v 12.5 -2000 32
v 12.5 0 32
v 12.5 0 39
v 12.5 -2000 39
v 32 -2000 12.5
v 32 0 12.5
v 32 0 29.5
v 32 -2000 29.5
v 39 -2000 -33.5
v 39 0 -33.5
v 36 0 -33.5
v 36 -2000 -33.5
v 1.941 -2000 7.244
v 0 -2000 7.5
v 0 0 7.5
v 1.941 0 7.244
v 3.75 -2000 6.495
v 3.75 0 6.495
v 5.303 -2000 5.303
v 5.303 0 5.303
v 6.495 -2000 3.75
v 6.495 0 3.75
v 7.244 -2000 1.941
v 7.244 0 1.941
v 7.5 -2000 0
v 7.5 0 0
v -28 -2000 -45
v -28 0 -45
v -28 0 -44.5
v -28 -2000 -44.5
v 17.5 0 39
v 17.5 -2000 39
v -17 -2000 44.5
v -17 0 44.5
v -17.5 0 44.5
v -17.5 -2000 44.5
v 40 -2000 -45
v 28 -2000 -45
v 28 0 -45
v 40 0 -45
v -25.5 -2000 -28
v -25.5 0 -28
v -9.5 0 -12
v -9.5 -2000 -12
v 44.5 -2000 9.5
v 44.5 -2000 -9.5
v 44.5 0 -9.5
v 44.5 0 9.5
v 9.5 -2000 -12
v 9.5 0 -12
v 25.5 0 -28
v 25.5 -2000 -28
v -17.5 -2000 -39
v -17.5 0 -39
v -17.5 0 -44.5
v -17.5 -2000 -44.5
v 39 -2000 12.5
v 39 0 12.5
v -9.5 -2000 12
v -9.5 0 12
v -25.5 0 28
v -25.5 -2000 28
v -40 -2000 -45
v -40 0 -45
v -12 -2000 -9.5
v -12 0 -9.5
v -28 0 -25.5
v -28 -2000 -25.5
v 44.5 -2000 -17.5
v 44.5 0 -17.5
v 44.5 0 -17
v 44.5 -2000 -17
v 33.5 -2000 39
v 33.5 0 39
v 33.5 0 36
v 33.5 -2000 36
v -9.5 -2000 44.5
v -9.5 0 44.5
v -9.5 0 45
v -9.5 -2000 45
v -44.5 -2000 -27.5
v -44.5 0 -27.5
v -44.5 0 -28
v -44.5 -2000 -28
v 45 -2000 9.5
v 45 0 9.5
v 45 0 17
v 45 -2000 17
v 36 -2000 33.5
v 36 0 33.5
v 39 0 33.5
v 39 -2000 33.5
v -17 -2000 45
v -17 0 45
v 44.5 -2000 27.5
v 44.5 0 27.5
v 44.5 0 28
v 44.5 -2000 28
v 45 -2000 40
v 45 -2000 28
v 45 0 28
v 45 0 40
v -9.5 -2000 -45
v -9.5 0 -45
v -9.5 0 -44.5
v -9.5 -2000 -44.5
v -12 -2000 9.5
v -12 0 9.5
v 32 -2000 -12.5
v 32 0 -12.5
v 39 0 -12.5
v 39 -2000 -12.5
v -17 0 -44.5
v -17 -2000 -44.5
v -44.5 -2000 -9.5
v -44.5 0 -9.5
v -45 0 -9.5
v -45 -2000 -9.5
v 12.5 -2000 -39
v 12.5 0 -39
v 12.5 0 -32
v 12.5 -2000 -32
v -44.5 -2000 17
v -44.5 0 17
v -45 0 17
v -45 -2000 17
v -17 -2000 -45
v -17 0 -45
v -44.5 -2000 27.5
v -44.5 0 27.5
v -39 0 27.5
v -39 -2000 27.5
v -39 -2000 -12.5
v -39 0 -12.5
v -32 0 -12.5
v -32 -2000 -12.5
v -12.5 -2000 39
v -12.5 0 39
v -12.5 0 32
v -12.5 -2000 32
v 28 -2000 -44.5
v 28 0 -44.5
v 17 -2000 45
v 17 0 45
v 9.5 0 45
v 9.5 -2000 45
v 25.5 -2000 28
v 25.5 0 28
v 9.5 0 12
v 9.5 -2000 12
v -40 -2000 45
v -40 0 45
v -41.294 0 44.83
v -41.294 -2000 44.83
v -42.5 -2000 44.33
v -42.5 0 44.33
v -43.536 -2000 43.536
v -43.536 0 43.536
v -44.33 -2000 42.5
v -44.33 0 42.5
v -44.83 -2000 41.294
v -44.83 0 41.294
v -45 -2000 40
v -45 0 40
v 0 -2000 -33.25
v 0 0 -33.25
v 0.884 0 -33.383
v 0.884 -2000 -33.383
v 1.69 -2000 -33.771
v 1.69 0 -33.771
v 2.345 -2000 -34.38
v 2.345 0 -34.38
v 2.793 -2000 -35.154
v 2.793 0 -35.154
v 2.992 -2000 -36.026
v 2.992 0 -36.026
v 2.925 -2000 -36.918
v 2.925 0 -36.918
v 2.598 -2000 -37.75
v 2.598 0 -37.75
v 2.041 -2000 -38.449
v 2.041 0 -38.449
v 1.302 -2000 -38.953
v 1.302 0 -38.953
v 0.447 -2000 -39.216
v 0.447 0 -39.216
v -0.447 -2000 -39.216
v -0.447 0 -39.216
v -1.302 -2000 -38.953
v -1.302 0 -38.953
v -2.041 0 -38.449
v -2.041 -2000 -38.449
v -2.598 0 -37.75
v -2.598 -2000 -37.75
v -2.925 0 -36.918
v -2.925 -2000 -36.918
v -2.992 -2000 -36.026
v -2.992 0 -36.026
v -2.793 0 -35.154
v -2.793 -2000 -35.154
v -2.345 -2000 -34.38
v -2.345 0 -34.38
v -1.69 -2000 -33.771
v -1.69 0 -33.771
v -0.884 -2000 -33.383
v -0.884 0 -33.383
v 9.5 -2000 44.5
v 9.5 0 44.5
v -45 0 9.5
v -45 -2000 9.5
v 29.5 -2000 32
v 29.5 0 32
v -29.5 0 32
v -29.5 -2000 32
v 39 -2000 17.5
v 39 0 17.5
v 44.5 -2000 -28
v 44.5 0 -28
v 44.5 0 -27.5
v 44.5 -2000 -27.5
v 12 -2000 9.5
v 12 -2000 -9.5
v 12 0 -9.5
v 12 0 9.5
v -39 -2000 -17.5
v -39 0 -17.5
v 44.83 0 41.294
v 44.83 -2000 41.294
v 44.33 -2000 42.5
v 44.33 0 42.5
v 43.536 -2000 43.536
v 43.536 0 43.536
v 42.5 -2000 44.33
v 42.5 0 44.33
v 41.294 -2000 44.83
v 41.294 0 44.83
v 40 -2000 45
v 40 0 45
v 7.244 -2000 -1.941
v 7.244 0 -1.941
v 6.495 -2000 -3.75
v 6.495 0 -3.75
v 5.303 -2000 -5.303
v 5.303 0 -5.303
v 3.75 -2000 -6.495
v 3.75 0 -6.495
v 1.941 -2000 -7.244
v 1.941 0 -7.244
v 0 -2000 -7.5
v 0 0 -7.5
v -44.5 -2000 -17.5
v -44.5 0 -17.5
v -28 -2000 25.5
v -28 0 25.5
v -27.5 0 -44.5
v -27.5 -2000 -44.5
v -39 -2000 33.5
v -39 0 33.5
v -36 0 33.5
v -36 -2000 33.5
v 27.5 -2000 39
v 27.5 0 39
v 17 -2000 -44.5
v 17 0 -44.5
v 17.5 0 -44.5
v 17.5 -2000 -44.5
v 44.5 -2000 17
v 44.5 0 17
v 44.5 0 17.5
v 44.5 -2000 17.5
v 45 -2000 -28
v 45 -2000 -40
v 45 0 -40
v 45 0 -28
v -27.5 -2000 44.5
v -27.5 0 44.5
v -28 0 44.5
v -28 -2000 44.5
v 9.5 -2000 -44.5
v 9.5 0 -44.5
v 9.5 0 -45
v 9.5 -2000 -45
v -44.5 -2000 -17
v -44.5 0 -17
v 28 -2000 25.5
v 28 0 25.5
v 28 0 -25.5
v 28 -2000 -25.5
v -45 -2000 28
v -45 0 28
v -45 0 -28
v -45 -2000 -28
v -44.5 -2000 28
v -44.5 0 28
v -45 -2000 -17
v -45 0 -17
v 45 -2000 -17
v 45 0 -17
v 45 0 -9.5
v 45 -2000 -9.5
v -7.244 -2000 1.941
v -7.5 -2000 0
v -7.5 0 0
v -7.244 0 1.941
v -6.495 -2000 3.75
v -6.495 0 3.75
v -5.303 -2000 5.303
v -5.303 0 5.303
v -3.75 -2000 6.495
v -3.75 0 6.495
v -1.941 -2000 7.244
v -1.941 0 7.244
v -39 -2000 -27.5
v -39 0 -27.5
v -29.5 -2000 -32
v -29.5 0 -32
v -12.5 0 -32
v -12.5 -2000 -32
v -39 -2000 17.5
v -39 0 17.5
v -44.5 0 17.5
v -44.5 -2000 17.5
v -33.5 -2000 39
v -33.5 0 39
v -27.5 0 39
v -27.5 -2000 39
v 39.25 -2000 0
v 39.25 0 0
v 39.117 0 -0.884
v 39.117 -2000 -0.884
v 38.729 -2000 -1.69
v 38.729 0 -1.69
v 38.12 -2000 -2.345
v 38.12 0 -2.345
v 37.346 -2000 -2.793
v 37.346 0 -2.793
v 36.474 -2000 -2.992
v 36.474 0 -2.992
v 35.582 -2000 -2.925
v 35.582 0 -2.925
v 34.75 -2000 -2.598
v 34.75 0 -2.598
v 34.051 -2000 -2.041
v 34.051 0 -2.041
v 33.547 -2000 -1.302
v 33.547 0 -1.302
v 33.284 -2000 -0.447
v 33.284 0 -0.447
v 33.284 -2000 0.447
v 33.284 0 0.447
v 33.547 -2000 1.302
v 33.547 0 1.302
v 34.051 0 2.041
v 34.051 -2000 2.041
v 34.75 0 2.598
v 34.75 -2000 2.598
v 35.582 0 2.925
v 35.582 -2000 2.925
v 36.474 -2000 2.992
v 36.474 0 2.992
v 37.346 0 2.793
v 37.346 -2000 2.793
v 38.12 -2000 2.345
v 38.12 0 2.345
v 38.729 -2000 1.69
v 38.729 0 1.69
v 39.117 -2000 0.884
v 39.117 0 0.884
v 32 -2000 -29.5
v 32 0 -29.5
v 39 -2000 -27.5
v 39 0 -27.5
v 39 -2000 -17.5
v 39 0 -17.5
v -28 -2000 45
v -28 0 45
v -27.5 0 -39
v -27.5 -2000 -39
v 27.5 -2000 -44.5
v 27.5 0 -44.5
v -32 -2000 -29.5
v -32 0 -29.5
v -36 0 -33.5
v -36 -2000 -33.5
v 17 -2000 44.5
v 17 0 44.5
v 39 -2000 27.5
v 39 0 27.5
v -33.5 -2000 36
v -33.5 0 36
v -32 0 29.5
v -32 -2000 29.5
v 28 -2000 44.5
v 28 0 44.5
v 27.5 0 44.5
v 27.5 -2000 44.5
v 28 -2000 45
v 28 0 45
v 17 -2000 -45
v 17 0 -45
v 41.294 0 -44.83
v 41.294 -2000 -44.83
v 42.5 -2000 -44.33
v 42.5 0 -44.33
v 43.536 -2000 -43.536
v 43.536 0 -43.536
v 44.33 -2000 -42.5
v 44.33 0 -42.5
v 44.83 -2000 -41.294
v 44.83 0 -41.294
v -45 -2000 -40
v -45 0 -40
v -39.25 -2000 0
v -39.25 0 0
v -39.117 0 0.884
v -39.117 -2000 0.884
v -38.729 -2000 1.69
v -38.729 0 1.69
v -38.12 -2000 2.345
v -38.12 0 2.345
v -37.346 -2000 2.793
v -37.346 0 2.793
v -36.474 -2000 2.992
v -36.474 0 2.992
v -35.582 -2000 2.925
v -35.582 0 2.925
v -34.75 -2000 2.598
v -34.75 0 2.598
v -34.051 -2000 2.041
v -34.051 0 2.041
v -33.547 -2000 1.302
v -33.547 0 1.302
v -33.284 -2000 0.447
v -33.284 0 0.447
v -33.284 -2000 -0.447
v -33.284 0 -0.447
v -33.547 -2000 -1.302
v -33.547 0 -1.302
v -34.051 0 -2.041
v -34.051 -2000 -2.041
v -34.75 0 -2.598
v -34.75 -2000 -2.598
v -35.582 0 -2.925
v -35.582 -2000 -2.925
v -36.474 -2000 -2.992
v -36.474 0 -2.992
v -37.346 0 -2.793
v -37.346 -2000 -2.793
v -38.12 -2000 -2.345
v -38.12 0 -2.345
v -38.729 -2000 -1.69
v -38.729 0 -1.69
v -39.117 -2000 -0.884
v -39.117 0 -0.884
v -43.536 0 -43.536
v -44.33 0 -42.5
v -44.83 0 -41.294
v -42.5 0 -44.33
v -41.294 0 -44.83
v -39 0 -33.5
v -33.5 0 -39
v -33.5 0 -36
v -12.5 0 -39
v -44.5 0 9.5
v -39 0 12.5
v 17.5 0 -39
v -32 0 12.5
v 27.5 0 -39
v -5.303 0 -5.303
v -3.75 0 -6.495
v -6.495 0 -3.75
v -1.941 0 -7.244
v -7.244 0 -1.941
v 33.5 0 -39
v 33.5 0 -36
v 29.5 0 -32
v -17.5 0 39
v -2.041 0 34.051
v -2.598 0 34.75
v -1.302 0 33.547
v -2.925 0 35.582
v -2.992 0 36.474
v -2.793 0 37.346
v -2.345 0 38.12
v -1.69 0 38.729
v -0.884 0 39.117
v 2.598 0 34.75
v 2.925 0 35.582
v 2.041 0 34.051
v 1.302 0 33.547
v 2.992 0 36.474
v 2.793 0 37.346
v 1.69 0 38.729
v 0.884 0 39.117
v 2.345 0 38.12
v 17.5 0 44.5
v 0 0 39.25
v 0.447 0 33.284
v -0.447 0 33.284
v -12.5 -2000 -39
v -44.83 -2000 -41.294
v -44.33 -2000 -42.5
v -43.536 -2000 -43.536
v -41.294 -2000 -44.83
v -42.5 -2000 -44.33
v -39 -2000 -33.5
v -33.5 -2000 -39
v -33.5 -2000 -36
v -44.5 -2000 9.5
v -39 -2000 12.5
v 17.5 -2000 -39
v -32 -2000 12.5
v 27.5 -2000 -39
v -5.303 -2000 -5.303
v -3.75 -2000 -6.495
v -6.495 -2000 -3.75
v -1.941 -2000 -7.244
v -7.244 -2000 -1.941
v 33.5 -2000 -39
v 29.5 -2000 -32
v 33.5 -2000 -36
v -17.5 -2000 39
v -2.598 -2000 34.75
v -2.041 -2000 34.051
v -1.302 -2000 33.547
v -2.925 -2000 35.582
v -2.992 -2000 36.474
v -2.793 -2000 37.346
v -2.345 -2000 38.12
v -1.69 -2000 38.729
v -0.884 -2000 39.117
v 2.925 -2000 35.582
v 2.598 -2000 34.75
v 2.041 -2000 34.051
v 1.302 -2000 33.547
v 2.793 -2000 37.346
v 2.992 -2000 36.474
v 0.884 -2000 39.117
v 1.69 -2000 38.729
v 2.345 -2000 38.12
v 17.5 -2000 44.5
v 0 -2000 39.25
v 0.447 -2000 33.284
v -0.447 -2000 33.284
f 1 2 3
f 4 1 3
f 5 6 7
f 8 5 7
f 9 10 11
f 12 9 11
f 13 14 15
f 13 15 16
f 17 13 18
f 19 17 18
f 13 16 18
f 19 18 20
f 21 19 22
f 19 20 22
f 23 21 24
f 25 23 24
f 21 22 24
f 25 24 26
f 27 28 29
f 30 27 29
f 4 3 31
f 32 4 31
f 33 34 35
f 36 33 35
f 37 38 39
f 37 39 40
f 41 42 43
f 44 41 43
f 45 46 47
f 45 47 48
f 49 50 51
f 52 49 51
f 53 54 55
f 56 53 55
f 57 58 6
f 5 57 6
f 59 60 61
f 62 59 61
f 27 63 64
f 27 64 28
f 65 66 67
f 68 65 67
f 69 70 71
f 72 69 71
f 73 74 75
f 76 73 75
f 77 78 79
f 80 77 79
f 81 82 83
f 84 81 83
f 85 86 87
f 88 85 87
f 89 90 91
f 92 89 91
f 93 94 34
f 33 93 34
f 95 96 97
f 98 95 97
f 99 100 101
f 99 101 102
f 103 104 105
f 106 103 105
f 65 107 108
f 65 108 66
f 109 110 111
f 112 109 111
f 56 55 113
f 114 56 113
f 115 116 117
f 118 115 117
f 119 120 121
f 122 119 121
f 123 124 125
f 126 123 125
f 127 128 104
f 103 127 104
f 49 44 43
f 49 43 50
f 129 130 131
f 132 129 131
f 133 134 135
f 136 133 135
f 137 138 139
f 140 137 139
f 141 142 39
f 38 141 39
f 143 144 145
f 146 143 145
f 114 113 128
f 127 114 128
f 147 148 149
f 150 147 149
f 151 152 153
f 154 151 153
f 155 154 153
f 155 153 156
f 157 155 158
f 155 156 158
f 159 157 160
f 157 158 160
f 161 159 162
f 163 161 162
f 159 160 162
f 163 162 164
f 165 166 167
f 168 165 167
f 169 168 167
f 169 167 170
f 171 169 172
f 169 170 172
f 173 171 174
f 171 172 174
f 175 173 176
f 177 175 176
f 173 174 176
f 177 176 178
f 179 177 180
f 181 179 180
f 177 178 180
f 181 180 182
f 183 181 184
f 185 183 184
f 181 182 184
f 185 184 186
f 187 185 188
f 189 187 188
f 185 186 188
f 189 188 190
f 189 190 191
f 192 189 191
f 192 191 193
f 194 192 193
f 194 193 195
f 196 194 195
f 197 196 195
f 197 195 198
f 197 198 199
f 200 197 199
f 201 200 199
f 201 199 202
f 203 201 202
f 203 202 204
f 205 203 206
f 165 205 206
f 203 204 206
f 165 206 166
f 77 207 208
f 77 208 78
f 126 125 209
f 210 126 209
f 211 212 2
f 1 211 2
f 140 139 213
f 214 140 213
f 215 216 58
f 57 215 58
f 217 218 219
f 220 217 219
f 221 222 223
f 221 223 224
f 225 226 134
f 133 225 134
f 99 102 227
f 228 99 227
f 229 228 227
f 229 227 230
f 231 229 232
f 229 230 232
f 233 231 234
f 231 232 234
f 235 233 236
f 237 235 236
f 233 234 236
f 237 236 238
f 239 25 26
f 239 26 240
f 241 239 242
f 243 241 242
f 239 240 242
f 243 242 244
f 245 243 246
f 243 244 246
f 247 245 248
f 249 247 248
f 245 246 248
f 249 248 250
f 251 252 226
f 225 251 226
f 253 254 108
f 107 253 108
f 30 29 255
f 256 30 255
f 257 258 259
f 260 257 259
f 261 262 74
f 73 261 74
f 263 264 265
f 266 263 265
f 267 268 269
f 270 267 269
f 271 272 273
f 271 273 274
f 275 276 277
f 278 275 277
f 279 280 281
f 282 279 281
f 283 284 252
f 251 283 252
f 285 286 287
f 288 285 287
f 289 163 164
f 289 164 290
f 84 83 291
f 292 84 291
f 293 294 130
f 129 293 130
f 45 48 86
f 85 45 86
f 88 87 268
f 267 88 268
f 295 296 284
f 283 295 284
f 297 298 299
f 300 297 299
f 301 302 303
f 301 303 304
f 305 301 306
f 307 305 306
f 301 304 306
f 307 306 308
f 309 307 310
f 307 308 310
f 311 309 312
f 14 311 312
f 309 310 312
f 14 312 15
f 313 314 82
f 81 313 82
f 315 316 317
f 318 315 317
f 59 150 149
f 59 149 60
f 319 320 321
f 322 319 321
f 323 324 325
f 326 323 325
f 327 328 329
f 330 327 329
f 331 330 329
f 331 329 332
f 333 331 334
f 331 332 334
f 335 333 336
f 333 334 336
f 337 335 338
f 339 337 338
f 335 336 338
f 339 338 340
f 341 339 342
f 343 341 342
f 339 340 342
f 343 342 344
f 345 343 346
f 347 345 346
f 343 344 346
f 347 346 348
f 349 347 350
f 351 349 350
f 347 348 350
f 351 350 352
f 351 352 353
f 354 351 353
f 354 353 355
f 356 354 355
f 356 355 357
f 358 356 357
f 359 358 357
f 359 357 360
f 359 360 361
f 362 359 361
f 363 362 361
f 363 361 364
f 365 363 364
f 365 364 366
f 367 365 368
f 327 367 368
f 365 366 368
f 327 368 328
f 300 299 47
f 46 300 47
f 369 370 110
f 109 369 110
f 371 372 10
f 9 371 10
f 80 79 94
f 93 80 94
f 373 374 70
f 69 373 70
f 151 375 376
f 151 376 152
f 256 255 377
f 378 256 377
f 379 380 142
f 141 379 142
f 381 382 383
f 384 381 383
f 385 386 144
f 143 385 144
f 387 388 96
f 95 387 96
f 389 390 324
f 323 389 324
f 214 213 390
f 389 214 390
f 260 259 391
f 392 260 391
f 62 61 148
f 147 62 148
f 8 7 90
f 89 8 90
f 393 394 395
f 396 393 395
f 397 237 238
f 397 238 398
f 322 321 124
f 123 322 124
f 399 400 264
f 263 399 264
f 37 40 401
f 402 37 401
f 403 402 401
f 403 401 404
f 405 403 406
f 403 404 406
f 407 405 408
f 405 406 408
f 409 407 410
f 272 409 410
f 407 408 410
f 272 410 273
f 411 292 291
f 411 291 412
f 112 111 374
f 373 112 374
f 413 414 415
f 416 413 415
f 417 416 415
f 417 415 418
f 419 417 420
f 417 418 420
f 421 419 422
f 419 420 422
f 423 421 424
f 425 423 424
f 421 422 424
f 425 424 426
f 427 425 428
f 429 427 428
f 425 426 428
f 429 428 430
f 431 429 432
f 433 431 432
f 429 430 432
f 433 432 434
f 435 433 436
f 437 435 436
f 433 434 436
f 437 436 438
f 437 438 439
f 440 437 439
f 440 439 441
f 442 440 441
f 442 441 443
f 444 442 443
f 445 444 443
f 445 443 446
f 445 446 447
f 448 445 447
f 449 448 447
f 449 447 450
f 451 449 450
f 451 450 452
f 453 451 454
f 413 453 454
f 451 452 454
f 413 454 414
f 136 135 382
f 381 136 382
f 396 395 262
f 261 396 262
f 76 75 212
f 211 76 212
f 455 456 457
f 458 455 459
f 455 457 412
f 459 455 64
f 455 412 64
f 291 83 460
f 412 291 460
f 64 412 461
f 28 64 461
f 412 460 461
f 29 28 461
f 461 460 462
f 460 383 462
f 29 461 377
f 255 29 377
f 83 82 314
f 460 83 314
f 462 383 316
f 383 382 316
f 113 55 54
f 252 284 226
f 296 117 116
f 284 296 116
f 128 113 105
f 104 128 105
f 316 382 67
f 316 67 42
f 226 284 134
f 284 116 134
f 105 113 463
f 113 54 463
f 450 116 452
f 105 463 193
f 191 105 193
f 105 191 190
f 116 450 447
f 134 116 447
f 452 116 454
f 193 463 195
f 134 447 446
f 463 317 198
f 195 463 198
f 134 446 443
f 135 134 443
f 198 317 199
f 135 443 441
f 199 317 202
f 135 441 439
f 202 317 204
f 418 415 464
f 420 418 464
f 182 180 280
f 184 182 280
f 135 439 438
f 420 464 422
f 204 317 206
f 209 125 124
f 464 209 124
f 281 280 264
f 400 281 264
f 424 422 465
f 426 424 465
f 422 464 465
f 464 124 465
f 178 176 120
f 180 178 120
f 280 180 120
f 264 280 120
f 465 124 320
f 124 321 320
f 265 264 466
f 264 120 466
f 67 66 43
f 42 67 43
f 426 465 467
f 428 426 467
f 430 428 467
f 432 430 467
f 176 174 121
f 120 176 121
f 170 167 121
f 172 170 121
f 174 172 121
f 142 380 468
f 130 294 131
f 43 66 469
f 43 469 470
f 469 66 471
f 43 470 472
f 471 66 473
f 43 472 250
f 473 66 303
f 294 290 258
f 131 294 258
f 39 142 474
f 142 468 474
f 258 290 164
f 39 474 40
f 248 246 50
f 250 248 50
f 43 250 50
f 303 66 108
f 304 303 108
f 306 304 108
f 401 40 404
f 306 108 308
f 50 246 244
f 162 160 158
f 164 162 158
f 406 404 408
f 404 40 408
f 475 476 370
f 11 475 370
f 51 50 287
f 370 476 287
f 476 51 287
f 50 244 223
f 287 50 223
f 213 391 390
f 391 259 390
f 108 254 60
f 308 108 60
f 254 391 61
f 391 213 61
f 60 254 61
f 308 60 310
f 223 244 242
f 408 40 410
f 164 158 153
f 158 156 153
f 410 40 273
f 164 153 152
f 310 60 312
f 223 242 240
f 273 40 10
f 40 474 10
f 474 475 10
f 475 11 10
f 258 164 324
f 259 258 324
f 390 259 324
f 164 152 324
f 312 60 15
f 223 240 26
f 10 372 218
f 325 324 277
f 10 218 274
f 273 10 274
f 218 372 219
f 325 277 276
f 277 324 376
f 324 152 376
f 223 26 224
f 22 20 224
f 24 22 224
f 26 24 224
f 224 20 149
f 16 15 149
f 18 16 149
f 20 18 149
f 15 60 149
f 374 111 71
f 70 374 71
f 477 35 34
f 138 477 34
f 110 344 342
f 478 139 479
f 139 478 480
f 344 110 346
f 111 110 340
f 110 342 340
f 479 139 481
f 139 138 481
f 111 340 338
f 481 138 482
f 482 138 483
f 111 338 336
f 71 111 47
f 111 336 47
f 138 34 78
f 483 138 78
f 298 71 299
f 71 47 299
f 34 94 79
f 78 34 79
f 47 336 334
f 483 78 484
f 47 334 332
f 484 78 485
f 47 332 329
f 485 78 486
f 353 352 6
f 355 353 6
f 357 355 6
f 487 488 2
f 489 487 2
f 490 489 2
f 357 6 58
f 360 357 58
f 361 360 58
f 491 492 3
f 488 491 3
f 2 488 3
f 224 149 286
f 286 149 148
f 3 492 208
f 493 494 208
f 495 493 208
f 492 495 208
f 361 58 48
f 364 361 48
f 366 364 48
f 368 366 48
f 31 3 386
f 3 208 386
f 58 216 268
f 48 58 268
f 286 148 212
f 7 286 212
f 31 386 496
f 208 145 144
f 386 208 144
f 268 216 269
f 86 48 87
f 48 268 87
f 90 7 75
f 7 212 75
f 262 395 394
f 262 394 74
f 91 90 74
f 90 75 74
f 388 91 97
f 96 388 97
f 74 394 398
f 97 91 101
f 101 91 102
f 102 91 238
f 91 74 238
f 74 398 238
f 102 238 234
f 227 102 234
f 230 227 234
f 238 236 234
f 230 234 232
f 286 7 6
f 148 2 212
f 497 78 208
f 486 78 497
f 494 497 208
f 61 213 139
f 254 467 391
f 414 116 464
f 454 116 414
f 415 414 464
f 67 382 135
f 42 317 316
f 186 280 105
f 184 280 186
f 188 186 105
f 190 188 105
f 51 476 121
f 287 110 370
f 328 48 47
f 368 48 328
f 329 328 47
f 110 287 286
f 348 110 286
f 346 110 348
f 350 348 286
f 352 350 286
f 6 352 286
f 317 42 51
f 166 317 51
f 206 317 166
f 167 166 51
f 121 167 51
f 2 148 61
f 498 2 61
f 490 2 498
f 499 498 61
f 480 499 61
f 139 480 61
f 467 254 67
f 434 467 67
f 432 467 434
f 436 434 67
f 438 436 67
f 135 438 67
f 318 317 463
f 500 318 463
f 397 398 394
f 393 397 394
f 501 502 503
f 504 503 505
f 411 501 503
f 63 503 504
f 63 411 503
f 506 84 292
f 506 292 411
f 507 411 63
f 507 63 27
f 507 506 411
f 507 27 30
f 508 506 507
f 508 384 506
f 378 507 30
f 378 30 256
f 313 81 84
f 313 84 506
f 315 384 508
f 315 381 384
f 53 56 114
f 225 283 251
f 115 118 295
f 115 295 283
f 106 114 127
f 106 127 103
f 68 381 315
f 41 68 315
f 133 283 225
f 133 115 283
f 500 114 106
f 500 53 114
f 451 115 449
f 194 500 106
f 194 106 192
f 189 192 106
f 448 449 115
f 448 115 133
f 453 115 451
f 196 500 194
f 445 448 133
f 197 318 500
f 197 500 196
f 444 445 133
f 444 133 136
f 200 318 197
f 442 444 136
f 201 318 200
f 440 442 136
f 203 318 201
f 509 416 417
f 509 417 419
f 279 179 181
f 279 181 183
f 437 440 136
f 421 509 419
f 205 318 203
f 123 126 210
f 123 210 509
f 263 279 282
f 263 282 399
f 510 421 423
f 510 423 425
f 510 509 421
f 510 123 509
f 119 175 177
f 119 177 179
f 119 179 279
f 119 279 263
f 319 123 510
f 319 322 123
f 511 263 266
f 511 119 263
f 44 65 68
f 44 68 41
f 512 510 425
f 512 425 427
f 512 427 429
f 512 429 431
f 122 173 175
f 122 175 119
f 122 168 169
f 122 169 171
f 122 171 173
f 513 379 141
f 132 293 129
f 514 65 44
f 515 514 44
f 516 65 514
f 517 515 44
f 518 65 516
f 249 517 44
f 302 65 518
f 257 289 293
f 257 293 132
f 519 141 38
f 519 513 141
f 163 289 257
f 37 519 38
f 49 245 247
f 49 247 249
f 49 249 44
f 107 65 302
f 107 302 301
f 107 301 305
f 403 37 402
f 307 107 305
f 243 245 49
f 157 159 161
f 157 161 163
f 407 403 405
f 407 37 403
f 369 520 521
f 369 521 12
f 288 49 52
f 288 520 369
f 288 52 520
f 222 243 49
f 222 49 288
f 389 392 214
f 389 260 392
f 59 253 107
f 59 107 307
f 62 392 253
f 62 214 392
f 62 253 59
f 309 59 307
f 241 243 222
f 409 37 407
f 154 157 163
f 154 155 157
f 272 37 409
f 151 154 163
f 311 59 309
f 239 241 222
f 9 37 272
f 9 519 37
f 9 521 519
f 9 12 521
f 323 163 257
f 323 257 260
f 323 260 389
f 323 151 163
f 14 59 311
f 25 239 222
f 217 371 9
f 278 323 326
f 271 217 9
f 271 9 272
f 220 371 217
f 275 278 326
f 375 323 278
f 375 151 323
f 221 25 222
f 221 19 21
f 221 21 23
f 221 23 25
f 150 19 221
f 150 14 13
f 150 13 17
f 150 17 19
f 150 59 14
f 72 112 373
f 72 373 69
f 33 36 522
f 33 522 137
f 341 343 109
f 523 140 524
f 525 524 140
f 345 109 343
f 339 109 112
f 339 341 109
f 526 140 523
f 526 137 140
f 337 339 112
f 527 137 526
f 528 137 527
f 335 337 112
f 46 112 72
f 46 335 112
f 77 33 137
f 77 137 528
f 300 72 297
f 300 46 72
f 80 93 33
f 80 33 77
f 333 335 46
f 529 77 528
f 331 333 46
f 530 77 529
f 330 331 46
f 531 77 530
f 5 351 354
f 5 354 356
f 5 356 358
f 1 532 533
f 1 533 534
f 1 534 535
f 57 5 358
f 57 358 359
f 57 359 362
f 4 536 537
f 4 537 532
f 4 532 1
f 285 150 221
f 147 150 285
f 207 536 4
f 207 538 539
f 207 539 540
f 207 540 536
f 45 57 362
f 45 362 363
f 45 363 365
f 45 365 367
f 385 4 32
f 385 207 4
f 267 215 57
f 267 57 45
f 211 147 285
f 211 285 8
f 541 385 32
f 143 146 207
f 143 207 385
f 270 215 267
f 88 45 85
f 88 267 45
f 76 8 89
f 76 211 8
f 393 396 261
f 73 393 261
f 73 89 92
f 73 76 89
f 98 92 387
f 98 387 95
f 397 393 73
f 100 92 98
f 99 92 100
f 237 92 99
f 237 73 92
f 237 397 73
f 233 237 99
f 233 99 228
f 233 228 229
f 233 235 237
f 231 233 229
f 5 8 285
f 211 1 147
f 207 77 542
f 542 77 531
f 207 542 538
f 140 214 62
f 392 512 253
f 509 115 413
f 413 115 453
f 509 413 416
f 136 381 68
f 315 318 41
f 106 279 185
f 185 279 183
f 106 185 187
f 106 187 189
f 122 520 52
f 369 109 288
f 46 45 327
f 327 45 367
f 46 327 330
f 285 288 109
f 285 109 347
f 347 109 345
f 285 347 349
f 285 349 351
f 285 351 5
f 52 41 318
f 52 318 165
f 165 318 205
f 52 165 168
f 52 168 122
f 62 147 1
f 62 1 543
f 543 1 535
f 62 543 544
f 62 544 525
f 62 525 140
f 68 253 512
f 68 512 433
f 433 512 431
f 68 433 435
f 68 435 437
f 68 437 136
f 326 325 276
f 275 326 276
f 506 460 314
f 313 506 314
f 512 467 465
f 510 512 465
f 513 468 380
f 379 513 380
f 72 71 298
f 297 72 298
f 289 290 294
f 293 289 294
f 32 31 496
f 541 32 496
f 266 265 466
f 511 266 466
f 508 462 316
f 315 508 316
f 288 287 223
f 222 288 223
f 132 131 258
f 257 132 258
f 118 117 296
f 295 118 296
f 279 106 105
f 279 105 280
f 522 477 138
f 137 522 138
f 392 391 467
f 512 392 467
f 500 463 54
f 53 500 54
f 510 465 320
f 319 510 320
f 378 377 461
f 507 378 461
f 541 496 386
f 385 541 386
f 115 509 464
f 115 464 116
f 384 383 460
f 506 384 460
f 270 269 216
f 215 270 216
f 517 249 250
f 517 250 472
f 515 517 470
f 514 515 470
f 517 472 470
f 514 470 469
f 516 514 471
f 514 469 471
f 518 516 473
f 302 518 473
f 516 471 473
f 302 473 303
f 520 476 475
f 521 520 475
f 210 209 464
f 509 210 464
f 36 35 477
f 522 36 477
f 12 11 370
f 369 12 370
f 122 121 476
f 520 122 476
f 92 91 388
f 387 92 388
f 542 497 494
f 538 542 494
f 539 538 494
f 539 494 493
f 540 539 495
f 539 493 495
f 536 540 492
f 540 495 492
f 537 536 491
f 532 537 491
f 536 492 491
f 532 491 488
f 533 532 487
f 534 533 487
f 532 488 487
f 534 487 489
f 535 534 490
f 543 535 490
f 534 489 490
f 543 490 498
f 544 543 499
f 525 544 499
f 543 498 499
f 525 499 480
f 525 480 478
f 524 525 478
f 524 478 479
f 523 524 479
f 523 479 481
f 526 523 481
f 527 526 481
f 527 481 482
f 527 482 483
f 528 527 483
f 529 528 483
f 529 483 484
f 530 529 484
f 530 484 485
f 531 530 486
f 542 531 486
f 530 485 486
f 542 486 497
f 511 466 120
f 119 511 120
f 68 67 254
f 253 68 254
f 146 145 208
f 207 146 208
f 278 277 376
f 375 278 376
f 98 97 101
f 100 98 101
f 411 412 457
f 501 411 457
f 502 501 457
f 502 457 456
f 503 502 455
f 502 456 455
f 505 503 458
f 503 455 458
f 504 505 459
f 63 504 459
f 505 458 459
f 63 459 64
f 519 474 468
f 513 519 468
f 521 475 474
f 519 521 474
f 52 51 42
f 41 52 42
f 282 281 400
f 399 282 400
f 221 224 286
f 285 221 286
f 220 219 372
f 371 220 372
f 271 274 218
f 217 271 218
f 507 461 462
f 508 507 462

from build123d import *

# Parameters (mm, degrees)
F1_DEPTH = 2000


with BuildPart() as f1:
    # F0 (on Front) → F1 (new body)
    with BuildSketch(Plane.XZ):
        with BuildLine():
            ThreePointArc((0, -7.5), (-5.303301, -5.303301), (-7.5, 0))
            Line((-7.5, 0), (-12, 0))
            Line((-12, 0), (-12, -9.5))
            Line((-12, -9.5), (-28, -25.5))
            Line((-28, -25.5), (-28, 0))
            Line((-28, 0), (-33.25, 0))
            ThreePointArc((-33.25, 0), (-36.25, -3), (-39.25, 0))
            Line((-39.25, 0), (-44.5, 0))
            Line((-44.5, 0), (-44.5, -9.5))
            Line((-44.5, -9.5), (-45, -9.5))
            Line((-45, -9.5), (-45, -17))
            Line((-45, -17), (-44.5, -17))
            Line((-44.5, -17), (-44.5, -17.5))
            Line((-44.5, -17.5), (-39, -17.5))
            Line((-39, -17.5), (-39, -12.5))
            Line((-39, -12.5), (-32, -12.5))
            Line((-32, -12.5), (-32, -29.5))
            Line((-32, -29.5), (-36, -33.5))
            Line((-36, -33.5), (-39, -33.5))
            Line((-39, -33.5), (-39, -27.5))
            Line((-39, -27.5), (-44.5, -27.5))
            Line((-44.5, -27.5), (-44.5, -28))
            Line((-44.5, -28), (-45, -28))
            Line((-45, -28), (-45, -40))
            ThreePointArc((-45, -40), (-43.535534, -43.535534), (-40, -45))
            Line((-40, -45), (-28, -45))
            Line((-28, -45), (-28, -44.5))
            Line((-28, -44.5), (-27.5, -44.5))
            Line((-27.5, -44.5), (-27.5, -39))
            Line((-27.5, -39), (-33.5, -39))
            Line((-33.5, -39), (-33.5, -36))
            Line((-33.5, -36), (-29.5, -32))
            Line((-29.5, -32), (-12.5, -32))
            Line((-12.5, -32), (-12.5, -39))
            Line((-12.5, -39), (-17.5, -39))
            Line((-17.5, -39), (-17.5, -44.5))
            Line((-17.5, -44.5), (-17, -44.5))
            Line((-17, -44.5), (-17, -45))
            Line((-17, -45), (-9.5, -45))
            Line((-9.5, -45), (-9.5, -44.5))
            Line((-9.5, -44.5), (0, -44.5))
            Line((0, -44.5), (0, -39.25))
            ThreePointArc((0, -39.25), (-3, -36.25), (0, -33.25))
            Line((0, -33.25), (0, -28))
            Line((0, -28), (-25.5, -28))
            Line((-25.5, -28), (-9.5, -12))
            Line((-9.5, -12), (0, -12))
            Line((0, -12), (0, -7.5))
        make_face()
        with BuildLine():
            Line((0, 39.25), (0, 44.5))
            Line((0, 44.5), (-9.5, 44.5))
            Line((-9.5, 44.5), (-9.5, 45))
            Line((-9.5, 45), (-17, 45))
            Line((-17, 45), (-17, 44.5))
            Line((-17, 44.5), (-17.5, 44.5))
            Line((-17.5, 44.5), (-17.5, 39))
            Line((-17.5, 39), (-12.5, 39))
            Line((-12.5, 39), (-12.5, 32))
            Line((-12.5, 32), (-29.5, 32))
            Line((-29.5, 32), (-33.5, 36))
            Line((-33.5, 36), (-33.5, 39))
            Line((-33.5, 39), (-27.5, 39))
            Line((-27.5, 39), (-27.5, 44.5))
            Line((-27.5, 44.5), (-28, 44.5))
            Line((-28, 44.5), (-28, 45))
            Line((-28, 45), (-40, 45))
            ThreePointArc((-40, 45), (-43.535534, 43.535534), (-45, 40))
            Line((-45, 40), (-45, 28))
            Line((-45, 28), (-44.5, 28))
            Line((-44.5, 28), (-44.5, 27.5))
            Line((-44.5, 27.5), (-39, 27.5))
            Line((-39, 27.5), (-39, 33.5))
            Line((-39, 33.5), (-36, 33.5))
            Line((-36, 33.5), (-32, 29.5))
            Line((-32, 29.5), (-32, 12.5))
            Line((-32, 12.5), (-39, 12.5))
            Line((-39, 12.5), (-39, 17.5))
            Line((-39, 17.5), (-44.5, 17.5))
            Line((-44.5, 17.5), (-44.5, 17))
            Line((-44.5, 17), (-45, 17))
            Line((-45, 17), (-45, 9.5))
            Line((-45, 9.5), (-44.5, 9.5))
            Line((-44.5, 9.5), (-44.5, 0))
            Line((-44.5, 0), (-39.25, 0))
            ThreePointArc((-39.25, 0), (-36.25, 3), (-33.25, 0))
            Line((-33.25, 0), (-28, 0))
            Line((-28, 0), (-28, 25.5))
            Line((-28, 25.5), (-12, 9.5))
            Line((-12, 9.5), (-12, 0))
            Line((-12, 0), (-7.5, 0))
            ThreePointArc((-7.5, 0), (-5.303301, 5.303301), (0, 7.5))
            Line((0, 7.5), (0, 12))
            Line((0, 12), (-9.5, 12))
            Line((-9.5, 12), (-25.5, 28))
            Line((-25.5, 28), (0, 28))
            Line((0, 28), (0, 33.25))
            ThreePointArc((0, 33.25), (-3, 36.25), (0, 39.25))
        make_face()
        with BuildLine():
            Line((40, 45), (28, 45))
            Line((28, 45), (28, 44.5))
            Line((28, 44.5), (27.5, 44.5))
            Line((27.5, 44.5), (27.5, 39))
            Line((27.5, 39), (33.5, 39))
            Line((33.5, 39), (33.5, 36))
            Line((33.5, 36), (29.5, 32))
            Line((29.5, 32), (12.5, 32))
            Line((12.5, 32), (12.5, 39))
            Line((12.5, 39), (17.5, 39))
            Line((17.5, 39), (17.5, 44.5))
            Line((17.5, 44.5), (17, 44.5))
            Line((17, 44.5), (17, 45))
            Line((17, 45), (9.5, 45))
            Line((9.5, 45), (9.5, 44.5))
            Line((9.5, 44.5), (0, 44.5))
            Line((0, 44.5), (0, 39.25))
            ThreePointArc((0, 39.25), (3, 36.25), (0, 33.25))
            Line((0, 33.25), (0, 28))
            Line((0, 28), (25.5, 28))
            Line((25.5, 28), (9.5, 12))
            Line((9.5, 12), (0, 12))
            Line((0, 12), (0, 7.5))
            ThreePointArc((0, 7.5), (5.303301, 5.303301), (7.5, 0))
            Line((7.5, 0), (12, 0))
            Line((12, 0), (12, 9.5))
            Line((12, 9.5), (28, 25.5))
            Line((28, 25.5), (28, 0))
            Line((28, 0), (33.25, 0))
            ThreePointArc((33.25, 0), (36.25, 3), (39.25, 0))
            Line((39.25, 0), (44.5, 0))
            Line((44.5, 0), (44.5, 9.5))
            Line((44.5, 9.5), (45, 9.5))
            Line((45, 9.5), (45, 17))
            Line((45, 17), (44.5, 17))
            Line((44.5, 17), (44.5, 17.5))
            Line((44.5, 17.5), (39, 17.5))
            Line((39, 17.5), (39, 12.5))
            Line((39, 12.5), (32, 12.5))
            Line((32, 12.5), (32, 29.5))
            Line((32, 29.5), (36, 33.5))
            Line((36, 33.5), (39, 33.5))
            Line((39, 33.5), (39, 27.5))
            Line((39, 27.5), (44.5, 27.5))
            Line((44.5, 27.5), (44.5, 28))
            Line((44.5, 28), (45, 28))
            Line((45, 28), (45, 40))
            ThreePointArc((45, 40), (43.535534, 43.535534), (40, 45))
        make_face()
        with BuildLine():
            Line((44.5, -9.5), (44.5, 0))
            Line((44.5, 0), (39.25, 0))
            ThreePointArc((39.25, 0), (36.25, -3), (33.25, 0))
            Line((33.25, 0), (28, 0))
            Line((28, 0), (28, -25.5))
            Line((28, -25.5), (12, -9.5))
            Line((12, -9.5), (12, 0))
            Line((12, 0), (7.5, 0))
            ThreePointArc((7.5, 0), (5.303301, -5.303301), (0, -7.5))
            Line((0, -7.5), (0, -12))
            Line((0, -12), (9.5, -12))
            Line((9.5, -12), (25.5, -28))
            Line((25.5, -28), (0, -28))
            Line((0, -28), (0, -33.25))
            ThreePointArc((0, -33.25), (3, -36.25), (0, -39.25))
            Line((0, -39.25), (0, -44.5))
            Line((0, -44.5), (9.5, -44.5))
            Line((9.5, -44.5), (9.5, -45))
            Line((9.5, -45), (17, -45))
            Line((17, -45), (17, -44.5))
            Line((17, -44.5), (17.5, -44.5))
            Line((17.5, -44.5), (17.5, -39))
            Line((17.5, -39), (12.5, -39))
            Line((12.5, -39), (12.5, -32))
            Line((12.5, -32), (29.5, -32))
            Line((29.5, -32), (33.5, -36))
            Line((33.5, -36), (33.5, -39))
            Line((33.5, -39), (27.5, -39))
            Line((27.5, -39), (27.5, -44.5))
            Line((27.5, -44.5), (28, -44.5))
            Line((28, -44.5), (28, -45))
            Line((28, -45), (40, -45))
            ThreePointArc((40, -45), (43.535534, -43.535534), (45, -40))
            Line((45, -40), (45, -28))
            Line((45, -28), (44.5, -28))
            Line((44.5, -28), (44.5, -27.5))
            Line((44.5, -27.5), (39, -27.5))
            Line((39, -27.5), (39, -33.5))
            Line((39, -33.5), (36, -33.5))
            Line((36, -33.5), (32, -29.5))
            Line((32, -29.5), (32, -12.5))
            Line((32, -12.5), (39, -12.5))
            Line((39, -12.5), (39, -17.5))
            Line((39, -17.5), (44.5, -17.5))
            Line((44.5, -17.5), (44.5, -17))
            Line((44.5, -17), (45, -17))
            Line((45, -17), (45, -9.5))
            Line((45, -9.5), (44.5, -9.5))
        make_face()
    extrude(amount=F1_DEPTH)


solid = f1.part
